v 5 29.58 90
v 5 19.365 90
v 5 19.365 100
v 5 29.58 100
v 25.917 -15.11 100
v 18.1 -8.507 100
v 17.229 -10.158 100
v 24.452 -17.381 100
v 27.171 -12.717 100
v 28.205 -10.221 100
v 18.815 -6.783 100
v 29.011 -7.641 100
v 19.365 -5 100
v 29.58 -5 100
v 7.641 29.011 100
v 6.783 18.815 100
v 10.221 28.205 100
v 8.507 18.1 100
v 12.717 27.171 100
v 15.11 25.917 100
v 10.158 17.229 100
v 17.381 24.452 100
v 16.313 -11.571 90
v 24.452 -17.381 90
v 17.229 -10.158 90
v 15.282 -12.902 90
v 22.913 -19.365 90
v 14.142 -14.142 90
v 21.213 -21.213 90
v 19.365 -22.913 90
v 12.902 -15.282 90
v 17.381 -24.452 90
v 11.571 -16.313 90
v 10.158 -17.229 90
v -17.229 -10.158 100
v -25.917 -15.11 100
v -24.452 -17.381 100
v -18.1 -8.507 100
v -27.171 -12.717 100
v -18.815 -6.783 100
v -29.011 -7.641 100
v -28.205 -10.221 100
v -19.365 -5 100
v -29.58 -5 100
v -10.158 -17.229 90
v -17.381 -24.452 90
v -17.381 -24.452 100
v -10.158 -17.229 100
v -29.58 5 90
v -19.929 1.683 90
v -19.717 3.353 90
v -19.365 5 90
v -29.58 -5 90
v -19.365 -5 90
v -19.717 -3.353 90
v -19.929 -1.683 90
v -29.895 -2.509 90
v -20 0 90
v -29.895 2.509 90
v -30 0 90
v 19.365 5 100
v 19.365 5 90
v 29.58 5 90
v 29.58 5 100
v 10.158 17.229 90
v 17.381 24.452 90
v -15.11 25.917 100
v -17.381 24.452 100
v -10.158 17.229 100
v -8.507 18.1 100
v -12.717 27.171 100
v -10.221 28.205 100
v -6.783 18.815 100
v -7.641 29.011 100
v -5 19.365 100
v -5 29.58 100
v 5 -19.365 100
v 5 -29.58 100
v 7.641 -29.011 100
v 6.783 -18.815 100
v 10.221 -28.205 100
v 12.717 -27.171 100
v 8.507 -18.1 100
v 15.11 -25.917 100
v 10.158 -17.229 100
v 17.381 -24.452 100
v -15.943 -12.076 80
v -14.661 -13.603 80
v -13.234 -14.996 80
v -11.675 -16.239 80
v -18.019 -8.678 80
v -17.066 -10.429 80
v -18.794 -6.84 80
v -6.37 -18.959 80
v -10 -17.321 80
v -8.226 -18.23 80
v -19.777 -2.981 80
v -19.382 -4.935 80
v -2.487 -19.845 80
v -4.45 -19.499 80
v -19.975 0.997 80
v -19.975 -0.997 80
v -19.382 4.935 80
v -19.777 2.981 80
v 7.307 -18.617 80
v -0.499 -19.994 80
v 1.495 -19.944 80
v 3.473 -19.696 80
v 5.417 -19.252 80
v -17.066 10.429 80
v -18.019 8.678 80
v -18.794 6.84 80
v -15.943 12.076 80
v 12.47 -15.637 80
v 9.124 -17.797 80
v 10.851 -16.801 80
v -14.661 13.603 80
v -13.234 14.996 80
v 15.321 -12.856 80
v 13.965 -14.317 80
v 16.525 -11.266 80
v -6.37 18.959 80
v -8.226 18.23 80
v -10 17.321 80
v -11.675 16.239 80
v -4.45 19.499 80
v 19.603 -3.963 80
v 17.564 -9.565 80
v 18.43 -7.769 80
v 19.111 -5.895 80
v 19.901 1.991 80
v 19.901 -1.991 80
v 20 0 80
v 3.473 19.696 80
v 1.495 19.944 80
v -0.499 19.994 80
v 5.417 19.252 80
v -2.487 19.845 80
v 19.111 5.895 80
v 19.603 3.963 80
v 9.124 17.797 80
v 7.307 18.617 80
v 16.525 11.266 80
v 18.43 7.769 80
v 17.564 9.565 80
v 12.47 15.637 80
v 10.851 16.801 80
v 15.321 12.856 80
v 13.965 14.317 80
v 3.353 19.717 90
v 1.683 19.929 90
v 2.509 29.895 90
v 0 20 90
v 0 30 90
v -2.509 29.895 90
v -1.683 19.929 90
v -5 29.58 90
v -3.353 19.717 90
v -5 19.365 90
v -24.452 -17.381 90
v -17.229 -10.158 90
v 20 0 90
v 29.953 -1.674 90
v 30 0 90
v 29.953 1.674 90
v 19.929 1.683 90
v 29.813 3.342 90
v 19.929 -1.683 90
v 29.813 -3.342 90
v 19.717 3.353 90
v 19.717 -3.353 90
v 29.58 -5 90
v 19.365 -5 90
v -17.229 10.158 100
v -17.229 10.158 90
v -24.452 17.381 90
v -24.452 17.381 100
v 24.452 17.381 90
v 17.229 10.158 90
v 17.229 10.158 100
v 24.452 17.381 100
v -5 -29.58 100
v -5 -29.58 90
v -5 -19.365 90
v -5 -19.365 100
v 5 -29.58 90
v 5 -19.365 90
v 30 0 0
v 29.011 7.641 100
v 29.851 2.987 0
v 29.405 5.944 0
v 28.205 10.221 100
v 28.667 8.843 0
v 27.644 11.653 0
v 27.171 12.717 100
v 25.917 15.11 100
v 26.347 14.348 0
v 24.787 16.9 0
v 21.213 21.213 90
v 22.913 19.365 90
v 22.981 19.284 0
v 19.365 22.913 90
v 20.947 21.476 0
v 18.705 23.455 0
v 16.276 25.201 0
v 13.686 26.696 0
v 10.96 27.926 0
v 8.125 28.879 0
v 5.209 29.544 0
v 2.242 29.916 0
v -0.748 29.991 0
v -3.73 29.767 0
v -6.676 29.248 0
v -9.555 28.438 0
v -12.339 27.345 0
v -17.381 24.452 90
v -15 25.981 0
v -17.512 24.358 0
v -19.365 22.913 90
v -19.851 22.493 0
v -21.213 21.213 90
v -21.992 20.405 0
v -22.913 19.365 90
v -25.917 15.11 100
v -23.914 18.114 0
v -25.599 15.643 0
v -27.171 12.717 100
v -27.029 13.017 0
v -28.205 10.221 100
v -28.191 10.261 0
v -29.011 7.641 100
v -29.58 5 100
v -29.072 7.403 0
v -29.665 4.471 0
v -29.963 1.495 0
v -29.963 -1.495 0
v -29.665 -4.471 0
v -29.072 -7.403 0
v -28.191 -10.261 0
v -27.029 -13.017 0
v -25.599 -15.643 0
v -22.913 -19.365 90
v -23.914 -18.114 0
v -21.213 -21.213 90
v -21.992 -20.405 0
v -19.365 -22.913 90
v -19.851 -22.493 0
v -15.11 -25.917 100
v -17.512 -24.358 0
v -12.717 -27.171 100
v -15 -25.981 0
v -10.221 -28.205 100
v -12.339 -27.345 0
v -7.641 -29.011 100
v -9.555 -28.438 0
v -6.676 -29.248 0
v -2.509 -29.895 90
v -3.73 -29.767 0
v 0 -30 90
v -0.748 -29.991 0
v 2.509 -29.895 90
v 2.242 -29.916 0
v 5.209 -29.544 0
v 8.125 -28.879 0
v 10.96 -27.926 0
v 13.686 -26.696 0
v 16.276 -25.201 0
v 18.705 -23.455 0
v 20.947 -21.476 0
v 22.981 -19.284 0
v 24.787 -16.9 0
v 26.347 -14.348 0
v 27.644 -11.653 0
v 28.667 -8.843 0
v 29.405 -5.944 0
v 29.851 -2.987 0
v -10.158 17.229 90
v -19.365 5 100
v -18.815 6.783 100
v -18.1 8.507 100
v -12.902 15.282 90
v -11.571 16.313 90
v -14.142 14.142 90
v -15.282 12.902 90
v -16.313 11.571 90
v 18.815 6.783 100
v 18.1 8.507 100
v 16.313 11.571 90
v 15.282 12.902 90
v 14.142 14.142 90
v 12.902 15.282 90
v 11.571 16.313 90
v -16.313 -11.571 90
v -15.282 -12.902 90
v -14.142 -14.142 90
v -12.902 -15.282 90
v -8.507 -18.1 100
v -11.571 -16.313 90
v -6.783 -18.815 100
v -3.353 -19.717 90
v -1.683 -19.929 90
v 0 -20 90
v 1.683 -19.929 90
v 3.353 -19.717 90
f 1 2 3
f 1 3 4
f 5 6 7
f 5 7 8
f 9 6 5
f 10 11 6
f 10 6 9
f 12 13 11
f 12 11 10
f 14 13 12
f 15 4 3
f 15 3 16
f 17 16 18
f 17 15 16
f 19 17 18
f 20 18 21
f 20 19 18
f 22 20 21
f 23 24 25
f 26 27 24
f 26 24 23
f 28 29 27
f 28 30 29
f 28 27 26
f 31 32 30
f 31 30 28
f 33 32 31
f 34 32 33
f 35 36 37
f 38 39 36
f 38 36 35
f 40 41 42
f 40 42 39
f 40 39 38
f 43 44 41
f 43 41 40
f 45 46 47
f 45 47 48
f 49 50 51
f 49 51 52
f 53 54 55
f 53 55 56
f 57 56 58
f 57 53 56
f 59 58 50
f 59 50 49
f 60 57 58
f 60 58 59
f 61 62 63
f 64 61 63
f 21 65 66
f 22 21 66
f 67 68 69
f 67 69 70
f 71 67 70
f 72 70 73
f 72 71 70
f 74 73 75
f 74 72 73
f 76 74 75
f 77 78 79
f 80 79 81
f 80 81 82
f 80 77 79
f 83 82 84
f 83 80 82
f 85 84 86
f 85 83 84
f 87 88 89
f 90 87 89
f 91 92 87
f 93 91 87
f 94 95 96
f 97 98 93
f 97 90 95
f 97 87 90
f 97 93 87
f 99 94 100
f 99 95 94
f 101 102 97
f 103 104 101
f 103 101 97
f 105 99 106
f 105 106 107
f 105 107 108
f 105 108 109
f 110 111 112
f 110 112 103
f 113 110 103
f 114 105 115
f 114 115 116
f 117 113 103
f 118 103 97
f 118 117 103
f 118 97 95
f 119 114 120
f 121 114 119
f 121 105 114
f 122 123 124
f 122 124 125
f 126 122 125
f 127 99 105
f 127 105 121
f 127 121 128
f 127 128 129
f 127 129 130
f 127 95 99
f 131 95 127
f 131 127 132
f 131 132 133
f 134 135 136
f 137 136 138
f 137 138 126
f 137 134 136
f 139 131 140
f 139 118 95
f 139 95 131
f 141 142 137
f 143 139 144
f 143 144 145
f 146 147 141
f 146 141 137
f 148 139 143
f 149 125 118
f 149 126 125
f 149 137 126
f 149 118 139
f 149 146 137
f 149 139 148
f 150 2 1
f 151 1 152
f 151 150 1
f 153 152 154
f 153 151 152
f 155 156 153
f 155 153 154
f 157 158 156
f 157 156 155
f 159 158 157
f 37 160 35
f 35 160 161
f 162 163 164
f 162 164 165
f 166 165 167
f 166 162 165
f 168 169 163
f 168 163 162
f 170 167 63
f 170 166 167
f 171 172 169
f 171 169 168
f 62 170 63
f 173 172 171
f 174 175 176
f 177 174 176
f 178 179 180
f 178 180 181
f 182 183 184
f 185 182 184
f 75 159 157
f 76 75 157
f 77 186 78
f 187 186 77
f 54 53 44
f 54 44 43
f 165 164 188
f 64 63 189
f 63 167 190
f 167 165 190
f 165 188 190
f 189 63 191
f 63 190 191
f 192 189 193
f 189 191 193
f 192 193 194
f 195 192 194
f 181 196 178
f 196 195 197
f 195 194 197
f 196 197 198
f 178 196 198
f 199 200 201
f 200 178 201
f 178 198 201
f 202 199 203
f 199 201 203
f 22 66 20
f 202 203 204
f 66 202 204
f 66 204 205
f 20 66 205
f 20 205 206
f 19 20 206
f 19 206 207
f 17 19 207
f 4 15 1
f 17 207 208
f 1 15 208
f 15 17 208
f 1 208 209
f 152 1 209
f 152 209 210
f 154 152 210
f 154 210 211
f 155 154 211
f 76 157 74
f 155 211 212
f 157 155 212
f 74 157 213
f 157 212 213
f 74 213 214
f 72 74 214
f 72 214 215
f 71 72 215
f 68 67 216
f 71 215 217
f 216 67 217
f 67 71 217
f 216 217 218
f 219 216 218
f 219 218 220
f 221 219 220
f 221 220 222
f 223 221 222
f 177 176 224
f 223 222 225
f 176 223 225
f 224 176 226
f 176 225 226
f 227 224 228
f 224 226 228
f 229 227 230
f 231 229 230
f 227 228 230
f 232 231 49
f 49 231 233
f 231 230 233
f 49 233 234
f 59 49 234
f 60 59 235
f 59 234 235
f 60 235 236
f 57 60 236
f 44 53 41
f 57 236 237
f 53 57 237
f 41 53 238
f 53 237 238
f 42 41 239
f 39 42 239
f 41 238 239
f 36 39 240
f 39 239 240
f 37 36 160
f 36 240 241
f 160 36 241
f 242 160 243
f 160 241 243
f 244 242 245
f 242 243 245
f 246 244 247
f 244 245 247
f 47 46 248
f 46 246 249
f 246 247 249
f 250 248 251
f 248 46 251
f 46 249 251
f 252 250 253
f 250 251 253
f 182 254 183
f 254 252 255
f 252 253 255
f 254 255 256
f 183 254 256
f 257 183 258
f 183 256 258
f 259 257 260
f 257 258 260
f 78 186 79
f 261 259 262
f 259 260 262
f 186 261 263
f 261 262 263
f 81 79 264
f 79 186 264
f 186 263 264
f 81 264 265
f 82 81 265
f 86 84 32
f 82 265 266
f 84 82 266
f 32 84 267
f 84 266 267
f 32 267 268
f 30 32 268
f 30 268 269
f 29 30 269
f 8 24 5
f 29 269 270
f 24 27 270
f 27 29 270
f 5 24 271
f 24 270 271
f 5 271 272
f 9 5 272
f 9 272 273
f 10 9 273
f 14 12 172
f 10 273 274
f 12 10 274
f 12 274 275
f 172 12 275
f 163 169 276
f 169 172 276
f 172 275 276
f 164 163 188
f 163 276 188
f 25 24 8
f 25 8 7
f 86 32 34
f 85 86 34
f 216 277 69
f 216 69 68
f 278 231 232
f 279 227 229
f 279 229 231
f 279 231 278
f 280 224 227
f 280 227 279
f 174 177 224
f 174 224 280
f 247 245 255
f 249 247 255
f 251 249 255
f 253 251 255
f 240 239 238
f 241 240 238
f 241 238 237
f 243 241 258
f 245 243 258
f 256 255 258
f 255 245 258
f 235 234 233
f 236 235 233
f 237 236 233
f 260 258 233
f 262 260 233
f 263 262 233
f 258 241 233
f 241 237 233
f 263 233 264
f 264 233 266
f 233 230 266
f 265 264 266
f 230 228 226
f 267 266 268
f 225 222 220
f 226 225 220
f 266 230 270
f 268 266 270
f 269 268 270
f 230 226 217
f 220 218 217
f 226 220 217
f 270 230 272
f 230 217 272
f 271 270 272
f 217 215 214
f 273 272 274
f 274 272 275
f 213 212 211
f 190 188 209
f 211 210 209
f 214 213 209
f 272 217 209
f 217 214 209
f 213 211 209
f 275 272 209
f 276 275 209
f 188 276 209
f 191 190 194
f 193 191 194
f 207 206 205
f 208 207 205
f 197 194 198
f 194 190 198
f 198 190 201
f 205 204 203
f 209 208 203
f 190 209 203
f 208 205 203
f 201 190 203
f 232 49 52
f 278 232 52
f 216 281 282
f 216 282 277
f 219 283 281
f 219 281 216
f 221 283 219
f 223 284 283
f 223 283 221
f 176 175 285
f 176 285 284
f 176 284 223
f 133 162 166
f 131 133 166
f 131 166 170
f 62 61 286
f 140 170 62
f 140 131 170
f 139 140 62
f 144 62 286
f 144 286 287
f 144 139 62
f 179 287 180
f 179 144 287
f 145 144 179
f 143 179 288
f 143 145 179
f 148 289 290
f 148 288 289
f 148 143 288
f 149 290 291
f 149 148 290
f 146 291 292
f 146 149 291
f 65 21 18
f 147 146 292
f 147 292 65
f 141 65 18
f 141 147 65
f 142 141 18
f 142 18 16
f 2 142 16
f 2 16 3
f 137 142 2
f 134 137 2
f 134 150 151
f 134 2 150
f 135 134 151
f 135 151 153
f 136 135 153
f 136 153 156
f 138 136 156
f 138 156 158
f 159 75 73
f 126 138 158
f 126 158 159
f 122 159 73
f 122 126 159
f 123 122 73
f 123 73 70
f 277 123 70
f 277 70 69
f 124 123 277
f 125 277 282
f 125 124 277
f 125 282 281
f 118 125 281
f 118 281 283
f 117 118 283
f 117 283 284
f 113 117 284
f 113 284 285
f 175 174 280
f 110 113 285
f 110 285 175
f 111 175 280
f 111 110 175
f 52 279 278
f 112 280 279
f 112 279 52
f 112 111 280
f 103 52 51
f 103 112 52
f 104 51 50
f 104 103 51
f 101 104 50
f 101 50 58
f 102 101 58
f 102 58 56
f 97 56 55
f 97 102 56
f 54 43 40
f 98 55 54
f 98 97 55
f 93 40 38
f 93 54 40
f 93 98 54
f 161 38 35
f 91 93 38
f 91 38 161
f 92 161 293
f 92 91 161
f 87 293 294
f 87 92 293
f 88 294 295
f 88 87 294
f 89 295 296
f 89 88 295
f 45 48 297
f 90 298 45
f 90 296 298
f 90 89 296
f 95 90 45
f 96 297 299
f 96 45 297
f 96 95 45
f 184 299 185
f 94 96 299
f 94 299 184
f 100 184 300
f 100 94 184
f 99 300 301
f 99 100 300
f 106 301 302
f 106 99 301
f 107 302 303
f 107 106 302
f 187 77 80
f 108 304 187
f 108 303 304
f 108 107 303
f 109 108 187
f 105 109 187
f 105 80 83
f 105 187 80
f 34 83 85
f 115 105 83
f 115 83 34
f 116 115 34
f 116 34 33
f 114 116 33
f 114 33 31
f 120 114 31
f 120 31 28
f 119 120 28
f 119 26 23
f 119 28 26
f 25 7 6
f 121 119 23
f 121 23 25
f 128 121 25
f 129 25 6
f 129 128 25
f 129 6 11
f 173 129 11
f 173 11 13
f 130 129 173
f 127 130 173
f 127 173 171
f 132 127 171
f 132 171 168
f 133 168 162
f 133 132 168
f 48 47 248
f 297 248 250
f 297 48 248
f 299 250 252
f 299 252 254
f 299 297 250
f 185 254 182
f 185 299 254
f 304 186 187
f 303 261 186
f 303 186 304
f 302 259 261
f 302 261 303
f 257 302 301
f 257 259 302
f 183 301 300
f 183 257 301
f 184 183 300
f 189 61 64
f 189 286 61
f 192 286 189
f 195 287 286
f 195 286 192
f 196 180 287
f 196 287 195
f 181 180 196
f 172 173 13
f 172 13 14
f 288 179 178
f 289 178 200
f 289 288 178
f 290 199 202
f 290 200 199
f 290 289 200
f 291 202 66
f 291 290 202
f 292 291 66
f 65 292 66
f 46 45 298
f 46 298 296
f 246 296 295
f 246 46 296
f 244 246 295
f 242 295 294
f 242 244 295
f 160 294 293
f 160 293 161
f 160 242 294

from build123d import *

# Parameters (mm, degrees)
BOX_W             = 70
BOX_H             = 10
BOX_DEPTH         = 11
ARRAY_COUNT       = 8
CYLINDER001_R     = 20
CYLINDER001_DEPTH = 30
CYLINDER_R        = 30
CYLINDER_DEPTH    = 100


with BuildPart() as fusion:
    # Box → Box (new body)
    with BuildSketch(Plane(origin=(-35, -5, 90), x_dir=(1, 0, 0), z_dir=(0, 0, 1))):
        with Locations((35, 5)):
            Rectangle(BOX_W, BOX_H)
    extrude(amount=BOX_DEPTH)

    # Array: Fusion ×8 about axis
    array_axis = Axis((0, 0, 0), (0, 0, 1))


with BuildPart() as fusion_1:
    add(fusion.part)
    for i in range(1, ARRAY_COUNT):
        add(fusion.part.rotate(array_axis, i * 360 / ARRAY_COUNT))


with BuildPart() as resta_azotea:
    # Cylinder001 → Cylinder001 (new body)
    with BuildSketch(Plane.XY.offset(80)):
        Circle(CYLINDER001_R)
    extrude(amount=CYLINDER001_DEPTH)


with BuildPart() as cut001:
    # Cylinder → Cylinder (new body)
    with BuildSketch(Plane.XY):
        Circle(CYLINDER_R)
    extrude(amount=CYLINDER_DEPTH)

    # Cut: cut resta_azotea
    add(resta_azotea.part, mode=Mode.SUBTRACT)

    # Cut001: cut Fusion
    add(fusion_1.part, mode=Mode.SUBTRACT)


solid = cut001.part
